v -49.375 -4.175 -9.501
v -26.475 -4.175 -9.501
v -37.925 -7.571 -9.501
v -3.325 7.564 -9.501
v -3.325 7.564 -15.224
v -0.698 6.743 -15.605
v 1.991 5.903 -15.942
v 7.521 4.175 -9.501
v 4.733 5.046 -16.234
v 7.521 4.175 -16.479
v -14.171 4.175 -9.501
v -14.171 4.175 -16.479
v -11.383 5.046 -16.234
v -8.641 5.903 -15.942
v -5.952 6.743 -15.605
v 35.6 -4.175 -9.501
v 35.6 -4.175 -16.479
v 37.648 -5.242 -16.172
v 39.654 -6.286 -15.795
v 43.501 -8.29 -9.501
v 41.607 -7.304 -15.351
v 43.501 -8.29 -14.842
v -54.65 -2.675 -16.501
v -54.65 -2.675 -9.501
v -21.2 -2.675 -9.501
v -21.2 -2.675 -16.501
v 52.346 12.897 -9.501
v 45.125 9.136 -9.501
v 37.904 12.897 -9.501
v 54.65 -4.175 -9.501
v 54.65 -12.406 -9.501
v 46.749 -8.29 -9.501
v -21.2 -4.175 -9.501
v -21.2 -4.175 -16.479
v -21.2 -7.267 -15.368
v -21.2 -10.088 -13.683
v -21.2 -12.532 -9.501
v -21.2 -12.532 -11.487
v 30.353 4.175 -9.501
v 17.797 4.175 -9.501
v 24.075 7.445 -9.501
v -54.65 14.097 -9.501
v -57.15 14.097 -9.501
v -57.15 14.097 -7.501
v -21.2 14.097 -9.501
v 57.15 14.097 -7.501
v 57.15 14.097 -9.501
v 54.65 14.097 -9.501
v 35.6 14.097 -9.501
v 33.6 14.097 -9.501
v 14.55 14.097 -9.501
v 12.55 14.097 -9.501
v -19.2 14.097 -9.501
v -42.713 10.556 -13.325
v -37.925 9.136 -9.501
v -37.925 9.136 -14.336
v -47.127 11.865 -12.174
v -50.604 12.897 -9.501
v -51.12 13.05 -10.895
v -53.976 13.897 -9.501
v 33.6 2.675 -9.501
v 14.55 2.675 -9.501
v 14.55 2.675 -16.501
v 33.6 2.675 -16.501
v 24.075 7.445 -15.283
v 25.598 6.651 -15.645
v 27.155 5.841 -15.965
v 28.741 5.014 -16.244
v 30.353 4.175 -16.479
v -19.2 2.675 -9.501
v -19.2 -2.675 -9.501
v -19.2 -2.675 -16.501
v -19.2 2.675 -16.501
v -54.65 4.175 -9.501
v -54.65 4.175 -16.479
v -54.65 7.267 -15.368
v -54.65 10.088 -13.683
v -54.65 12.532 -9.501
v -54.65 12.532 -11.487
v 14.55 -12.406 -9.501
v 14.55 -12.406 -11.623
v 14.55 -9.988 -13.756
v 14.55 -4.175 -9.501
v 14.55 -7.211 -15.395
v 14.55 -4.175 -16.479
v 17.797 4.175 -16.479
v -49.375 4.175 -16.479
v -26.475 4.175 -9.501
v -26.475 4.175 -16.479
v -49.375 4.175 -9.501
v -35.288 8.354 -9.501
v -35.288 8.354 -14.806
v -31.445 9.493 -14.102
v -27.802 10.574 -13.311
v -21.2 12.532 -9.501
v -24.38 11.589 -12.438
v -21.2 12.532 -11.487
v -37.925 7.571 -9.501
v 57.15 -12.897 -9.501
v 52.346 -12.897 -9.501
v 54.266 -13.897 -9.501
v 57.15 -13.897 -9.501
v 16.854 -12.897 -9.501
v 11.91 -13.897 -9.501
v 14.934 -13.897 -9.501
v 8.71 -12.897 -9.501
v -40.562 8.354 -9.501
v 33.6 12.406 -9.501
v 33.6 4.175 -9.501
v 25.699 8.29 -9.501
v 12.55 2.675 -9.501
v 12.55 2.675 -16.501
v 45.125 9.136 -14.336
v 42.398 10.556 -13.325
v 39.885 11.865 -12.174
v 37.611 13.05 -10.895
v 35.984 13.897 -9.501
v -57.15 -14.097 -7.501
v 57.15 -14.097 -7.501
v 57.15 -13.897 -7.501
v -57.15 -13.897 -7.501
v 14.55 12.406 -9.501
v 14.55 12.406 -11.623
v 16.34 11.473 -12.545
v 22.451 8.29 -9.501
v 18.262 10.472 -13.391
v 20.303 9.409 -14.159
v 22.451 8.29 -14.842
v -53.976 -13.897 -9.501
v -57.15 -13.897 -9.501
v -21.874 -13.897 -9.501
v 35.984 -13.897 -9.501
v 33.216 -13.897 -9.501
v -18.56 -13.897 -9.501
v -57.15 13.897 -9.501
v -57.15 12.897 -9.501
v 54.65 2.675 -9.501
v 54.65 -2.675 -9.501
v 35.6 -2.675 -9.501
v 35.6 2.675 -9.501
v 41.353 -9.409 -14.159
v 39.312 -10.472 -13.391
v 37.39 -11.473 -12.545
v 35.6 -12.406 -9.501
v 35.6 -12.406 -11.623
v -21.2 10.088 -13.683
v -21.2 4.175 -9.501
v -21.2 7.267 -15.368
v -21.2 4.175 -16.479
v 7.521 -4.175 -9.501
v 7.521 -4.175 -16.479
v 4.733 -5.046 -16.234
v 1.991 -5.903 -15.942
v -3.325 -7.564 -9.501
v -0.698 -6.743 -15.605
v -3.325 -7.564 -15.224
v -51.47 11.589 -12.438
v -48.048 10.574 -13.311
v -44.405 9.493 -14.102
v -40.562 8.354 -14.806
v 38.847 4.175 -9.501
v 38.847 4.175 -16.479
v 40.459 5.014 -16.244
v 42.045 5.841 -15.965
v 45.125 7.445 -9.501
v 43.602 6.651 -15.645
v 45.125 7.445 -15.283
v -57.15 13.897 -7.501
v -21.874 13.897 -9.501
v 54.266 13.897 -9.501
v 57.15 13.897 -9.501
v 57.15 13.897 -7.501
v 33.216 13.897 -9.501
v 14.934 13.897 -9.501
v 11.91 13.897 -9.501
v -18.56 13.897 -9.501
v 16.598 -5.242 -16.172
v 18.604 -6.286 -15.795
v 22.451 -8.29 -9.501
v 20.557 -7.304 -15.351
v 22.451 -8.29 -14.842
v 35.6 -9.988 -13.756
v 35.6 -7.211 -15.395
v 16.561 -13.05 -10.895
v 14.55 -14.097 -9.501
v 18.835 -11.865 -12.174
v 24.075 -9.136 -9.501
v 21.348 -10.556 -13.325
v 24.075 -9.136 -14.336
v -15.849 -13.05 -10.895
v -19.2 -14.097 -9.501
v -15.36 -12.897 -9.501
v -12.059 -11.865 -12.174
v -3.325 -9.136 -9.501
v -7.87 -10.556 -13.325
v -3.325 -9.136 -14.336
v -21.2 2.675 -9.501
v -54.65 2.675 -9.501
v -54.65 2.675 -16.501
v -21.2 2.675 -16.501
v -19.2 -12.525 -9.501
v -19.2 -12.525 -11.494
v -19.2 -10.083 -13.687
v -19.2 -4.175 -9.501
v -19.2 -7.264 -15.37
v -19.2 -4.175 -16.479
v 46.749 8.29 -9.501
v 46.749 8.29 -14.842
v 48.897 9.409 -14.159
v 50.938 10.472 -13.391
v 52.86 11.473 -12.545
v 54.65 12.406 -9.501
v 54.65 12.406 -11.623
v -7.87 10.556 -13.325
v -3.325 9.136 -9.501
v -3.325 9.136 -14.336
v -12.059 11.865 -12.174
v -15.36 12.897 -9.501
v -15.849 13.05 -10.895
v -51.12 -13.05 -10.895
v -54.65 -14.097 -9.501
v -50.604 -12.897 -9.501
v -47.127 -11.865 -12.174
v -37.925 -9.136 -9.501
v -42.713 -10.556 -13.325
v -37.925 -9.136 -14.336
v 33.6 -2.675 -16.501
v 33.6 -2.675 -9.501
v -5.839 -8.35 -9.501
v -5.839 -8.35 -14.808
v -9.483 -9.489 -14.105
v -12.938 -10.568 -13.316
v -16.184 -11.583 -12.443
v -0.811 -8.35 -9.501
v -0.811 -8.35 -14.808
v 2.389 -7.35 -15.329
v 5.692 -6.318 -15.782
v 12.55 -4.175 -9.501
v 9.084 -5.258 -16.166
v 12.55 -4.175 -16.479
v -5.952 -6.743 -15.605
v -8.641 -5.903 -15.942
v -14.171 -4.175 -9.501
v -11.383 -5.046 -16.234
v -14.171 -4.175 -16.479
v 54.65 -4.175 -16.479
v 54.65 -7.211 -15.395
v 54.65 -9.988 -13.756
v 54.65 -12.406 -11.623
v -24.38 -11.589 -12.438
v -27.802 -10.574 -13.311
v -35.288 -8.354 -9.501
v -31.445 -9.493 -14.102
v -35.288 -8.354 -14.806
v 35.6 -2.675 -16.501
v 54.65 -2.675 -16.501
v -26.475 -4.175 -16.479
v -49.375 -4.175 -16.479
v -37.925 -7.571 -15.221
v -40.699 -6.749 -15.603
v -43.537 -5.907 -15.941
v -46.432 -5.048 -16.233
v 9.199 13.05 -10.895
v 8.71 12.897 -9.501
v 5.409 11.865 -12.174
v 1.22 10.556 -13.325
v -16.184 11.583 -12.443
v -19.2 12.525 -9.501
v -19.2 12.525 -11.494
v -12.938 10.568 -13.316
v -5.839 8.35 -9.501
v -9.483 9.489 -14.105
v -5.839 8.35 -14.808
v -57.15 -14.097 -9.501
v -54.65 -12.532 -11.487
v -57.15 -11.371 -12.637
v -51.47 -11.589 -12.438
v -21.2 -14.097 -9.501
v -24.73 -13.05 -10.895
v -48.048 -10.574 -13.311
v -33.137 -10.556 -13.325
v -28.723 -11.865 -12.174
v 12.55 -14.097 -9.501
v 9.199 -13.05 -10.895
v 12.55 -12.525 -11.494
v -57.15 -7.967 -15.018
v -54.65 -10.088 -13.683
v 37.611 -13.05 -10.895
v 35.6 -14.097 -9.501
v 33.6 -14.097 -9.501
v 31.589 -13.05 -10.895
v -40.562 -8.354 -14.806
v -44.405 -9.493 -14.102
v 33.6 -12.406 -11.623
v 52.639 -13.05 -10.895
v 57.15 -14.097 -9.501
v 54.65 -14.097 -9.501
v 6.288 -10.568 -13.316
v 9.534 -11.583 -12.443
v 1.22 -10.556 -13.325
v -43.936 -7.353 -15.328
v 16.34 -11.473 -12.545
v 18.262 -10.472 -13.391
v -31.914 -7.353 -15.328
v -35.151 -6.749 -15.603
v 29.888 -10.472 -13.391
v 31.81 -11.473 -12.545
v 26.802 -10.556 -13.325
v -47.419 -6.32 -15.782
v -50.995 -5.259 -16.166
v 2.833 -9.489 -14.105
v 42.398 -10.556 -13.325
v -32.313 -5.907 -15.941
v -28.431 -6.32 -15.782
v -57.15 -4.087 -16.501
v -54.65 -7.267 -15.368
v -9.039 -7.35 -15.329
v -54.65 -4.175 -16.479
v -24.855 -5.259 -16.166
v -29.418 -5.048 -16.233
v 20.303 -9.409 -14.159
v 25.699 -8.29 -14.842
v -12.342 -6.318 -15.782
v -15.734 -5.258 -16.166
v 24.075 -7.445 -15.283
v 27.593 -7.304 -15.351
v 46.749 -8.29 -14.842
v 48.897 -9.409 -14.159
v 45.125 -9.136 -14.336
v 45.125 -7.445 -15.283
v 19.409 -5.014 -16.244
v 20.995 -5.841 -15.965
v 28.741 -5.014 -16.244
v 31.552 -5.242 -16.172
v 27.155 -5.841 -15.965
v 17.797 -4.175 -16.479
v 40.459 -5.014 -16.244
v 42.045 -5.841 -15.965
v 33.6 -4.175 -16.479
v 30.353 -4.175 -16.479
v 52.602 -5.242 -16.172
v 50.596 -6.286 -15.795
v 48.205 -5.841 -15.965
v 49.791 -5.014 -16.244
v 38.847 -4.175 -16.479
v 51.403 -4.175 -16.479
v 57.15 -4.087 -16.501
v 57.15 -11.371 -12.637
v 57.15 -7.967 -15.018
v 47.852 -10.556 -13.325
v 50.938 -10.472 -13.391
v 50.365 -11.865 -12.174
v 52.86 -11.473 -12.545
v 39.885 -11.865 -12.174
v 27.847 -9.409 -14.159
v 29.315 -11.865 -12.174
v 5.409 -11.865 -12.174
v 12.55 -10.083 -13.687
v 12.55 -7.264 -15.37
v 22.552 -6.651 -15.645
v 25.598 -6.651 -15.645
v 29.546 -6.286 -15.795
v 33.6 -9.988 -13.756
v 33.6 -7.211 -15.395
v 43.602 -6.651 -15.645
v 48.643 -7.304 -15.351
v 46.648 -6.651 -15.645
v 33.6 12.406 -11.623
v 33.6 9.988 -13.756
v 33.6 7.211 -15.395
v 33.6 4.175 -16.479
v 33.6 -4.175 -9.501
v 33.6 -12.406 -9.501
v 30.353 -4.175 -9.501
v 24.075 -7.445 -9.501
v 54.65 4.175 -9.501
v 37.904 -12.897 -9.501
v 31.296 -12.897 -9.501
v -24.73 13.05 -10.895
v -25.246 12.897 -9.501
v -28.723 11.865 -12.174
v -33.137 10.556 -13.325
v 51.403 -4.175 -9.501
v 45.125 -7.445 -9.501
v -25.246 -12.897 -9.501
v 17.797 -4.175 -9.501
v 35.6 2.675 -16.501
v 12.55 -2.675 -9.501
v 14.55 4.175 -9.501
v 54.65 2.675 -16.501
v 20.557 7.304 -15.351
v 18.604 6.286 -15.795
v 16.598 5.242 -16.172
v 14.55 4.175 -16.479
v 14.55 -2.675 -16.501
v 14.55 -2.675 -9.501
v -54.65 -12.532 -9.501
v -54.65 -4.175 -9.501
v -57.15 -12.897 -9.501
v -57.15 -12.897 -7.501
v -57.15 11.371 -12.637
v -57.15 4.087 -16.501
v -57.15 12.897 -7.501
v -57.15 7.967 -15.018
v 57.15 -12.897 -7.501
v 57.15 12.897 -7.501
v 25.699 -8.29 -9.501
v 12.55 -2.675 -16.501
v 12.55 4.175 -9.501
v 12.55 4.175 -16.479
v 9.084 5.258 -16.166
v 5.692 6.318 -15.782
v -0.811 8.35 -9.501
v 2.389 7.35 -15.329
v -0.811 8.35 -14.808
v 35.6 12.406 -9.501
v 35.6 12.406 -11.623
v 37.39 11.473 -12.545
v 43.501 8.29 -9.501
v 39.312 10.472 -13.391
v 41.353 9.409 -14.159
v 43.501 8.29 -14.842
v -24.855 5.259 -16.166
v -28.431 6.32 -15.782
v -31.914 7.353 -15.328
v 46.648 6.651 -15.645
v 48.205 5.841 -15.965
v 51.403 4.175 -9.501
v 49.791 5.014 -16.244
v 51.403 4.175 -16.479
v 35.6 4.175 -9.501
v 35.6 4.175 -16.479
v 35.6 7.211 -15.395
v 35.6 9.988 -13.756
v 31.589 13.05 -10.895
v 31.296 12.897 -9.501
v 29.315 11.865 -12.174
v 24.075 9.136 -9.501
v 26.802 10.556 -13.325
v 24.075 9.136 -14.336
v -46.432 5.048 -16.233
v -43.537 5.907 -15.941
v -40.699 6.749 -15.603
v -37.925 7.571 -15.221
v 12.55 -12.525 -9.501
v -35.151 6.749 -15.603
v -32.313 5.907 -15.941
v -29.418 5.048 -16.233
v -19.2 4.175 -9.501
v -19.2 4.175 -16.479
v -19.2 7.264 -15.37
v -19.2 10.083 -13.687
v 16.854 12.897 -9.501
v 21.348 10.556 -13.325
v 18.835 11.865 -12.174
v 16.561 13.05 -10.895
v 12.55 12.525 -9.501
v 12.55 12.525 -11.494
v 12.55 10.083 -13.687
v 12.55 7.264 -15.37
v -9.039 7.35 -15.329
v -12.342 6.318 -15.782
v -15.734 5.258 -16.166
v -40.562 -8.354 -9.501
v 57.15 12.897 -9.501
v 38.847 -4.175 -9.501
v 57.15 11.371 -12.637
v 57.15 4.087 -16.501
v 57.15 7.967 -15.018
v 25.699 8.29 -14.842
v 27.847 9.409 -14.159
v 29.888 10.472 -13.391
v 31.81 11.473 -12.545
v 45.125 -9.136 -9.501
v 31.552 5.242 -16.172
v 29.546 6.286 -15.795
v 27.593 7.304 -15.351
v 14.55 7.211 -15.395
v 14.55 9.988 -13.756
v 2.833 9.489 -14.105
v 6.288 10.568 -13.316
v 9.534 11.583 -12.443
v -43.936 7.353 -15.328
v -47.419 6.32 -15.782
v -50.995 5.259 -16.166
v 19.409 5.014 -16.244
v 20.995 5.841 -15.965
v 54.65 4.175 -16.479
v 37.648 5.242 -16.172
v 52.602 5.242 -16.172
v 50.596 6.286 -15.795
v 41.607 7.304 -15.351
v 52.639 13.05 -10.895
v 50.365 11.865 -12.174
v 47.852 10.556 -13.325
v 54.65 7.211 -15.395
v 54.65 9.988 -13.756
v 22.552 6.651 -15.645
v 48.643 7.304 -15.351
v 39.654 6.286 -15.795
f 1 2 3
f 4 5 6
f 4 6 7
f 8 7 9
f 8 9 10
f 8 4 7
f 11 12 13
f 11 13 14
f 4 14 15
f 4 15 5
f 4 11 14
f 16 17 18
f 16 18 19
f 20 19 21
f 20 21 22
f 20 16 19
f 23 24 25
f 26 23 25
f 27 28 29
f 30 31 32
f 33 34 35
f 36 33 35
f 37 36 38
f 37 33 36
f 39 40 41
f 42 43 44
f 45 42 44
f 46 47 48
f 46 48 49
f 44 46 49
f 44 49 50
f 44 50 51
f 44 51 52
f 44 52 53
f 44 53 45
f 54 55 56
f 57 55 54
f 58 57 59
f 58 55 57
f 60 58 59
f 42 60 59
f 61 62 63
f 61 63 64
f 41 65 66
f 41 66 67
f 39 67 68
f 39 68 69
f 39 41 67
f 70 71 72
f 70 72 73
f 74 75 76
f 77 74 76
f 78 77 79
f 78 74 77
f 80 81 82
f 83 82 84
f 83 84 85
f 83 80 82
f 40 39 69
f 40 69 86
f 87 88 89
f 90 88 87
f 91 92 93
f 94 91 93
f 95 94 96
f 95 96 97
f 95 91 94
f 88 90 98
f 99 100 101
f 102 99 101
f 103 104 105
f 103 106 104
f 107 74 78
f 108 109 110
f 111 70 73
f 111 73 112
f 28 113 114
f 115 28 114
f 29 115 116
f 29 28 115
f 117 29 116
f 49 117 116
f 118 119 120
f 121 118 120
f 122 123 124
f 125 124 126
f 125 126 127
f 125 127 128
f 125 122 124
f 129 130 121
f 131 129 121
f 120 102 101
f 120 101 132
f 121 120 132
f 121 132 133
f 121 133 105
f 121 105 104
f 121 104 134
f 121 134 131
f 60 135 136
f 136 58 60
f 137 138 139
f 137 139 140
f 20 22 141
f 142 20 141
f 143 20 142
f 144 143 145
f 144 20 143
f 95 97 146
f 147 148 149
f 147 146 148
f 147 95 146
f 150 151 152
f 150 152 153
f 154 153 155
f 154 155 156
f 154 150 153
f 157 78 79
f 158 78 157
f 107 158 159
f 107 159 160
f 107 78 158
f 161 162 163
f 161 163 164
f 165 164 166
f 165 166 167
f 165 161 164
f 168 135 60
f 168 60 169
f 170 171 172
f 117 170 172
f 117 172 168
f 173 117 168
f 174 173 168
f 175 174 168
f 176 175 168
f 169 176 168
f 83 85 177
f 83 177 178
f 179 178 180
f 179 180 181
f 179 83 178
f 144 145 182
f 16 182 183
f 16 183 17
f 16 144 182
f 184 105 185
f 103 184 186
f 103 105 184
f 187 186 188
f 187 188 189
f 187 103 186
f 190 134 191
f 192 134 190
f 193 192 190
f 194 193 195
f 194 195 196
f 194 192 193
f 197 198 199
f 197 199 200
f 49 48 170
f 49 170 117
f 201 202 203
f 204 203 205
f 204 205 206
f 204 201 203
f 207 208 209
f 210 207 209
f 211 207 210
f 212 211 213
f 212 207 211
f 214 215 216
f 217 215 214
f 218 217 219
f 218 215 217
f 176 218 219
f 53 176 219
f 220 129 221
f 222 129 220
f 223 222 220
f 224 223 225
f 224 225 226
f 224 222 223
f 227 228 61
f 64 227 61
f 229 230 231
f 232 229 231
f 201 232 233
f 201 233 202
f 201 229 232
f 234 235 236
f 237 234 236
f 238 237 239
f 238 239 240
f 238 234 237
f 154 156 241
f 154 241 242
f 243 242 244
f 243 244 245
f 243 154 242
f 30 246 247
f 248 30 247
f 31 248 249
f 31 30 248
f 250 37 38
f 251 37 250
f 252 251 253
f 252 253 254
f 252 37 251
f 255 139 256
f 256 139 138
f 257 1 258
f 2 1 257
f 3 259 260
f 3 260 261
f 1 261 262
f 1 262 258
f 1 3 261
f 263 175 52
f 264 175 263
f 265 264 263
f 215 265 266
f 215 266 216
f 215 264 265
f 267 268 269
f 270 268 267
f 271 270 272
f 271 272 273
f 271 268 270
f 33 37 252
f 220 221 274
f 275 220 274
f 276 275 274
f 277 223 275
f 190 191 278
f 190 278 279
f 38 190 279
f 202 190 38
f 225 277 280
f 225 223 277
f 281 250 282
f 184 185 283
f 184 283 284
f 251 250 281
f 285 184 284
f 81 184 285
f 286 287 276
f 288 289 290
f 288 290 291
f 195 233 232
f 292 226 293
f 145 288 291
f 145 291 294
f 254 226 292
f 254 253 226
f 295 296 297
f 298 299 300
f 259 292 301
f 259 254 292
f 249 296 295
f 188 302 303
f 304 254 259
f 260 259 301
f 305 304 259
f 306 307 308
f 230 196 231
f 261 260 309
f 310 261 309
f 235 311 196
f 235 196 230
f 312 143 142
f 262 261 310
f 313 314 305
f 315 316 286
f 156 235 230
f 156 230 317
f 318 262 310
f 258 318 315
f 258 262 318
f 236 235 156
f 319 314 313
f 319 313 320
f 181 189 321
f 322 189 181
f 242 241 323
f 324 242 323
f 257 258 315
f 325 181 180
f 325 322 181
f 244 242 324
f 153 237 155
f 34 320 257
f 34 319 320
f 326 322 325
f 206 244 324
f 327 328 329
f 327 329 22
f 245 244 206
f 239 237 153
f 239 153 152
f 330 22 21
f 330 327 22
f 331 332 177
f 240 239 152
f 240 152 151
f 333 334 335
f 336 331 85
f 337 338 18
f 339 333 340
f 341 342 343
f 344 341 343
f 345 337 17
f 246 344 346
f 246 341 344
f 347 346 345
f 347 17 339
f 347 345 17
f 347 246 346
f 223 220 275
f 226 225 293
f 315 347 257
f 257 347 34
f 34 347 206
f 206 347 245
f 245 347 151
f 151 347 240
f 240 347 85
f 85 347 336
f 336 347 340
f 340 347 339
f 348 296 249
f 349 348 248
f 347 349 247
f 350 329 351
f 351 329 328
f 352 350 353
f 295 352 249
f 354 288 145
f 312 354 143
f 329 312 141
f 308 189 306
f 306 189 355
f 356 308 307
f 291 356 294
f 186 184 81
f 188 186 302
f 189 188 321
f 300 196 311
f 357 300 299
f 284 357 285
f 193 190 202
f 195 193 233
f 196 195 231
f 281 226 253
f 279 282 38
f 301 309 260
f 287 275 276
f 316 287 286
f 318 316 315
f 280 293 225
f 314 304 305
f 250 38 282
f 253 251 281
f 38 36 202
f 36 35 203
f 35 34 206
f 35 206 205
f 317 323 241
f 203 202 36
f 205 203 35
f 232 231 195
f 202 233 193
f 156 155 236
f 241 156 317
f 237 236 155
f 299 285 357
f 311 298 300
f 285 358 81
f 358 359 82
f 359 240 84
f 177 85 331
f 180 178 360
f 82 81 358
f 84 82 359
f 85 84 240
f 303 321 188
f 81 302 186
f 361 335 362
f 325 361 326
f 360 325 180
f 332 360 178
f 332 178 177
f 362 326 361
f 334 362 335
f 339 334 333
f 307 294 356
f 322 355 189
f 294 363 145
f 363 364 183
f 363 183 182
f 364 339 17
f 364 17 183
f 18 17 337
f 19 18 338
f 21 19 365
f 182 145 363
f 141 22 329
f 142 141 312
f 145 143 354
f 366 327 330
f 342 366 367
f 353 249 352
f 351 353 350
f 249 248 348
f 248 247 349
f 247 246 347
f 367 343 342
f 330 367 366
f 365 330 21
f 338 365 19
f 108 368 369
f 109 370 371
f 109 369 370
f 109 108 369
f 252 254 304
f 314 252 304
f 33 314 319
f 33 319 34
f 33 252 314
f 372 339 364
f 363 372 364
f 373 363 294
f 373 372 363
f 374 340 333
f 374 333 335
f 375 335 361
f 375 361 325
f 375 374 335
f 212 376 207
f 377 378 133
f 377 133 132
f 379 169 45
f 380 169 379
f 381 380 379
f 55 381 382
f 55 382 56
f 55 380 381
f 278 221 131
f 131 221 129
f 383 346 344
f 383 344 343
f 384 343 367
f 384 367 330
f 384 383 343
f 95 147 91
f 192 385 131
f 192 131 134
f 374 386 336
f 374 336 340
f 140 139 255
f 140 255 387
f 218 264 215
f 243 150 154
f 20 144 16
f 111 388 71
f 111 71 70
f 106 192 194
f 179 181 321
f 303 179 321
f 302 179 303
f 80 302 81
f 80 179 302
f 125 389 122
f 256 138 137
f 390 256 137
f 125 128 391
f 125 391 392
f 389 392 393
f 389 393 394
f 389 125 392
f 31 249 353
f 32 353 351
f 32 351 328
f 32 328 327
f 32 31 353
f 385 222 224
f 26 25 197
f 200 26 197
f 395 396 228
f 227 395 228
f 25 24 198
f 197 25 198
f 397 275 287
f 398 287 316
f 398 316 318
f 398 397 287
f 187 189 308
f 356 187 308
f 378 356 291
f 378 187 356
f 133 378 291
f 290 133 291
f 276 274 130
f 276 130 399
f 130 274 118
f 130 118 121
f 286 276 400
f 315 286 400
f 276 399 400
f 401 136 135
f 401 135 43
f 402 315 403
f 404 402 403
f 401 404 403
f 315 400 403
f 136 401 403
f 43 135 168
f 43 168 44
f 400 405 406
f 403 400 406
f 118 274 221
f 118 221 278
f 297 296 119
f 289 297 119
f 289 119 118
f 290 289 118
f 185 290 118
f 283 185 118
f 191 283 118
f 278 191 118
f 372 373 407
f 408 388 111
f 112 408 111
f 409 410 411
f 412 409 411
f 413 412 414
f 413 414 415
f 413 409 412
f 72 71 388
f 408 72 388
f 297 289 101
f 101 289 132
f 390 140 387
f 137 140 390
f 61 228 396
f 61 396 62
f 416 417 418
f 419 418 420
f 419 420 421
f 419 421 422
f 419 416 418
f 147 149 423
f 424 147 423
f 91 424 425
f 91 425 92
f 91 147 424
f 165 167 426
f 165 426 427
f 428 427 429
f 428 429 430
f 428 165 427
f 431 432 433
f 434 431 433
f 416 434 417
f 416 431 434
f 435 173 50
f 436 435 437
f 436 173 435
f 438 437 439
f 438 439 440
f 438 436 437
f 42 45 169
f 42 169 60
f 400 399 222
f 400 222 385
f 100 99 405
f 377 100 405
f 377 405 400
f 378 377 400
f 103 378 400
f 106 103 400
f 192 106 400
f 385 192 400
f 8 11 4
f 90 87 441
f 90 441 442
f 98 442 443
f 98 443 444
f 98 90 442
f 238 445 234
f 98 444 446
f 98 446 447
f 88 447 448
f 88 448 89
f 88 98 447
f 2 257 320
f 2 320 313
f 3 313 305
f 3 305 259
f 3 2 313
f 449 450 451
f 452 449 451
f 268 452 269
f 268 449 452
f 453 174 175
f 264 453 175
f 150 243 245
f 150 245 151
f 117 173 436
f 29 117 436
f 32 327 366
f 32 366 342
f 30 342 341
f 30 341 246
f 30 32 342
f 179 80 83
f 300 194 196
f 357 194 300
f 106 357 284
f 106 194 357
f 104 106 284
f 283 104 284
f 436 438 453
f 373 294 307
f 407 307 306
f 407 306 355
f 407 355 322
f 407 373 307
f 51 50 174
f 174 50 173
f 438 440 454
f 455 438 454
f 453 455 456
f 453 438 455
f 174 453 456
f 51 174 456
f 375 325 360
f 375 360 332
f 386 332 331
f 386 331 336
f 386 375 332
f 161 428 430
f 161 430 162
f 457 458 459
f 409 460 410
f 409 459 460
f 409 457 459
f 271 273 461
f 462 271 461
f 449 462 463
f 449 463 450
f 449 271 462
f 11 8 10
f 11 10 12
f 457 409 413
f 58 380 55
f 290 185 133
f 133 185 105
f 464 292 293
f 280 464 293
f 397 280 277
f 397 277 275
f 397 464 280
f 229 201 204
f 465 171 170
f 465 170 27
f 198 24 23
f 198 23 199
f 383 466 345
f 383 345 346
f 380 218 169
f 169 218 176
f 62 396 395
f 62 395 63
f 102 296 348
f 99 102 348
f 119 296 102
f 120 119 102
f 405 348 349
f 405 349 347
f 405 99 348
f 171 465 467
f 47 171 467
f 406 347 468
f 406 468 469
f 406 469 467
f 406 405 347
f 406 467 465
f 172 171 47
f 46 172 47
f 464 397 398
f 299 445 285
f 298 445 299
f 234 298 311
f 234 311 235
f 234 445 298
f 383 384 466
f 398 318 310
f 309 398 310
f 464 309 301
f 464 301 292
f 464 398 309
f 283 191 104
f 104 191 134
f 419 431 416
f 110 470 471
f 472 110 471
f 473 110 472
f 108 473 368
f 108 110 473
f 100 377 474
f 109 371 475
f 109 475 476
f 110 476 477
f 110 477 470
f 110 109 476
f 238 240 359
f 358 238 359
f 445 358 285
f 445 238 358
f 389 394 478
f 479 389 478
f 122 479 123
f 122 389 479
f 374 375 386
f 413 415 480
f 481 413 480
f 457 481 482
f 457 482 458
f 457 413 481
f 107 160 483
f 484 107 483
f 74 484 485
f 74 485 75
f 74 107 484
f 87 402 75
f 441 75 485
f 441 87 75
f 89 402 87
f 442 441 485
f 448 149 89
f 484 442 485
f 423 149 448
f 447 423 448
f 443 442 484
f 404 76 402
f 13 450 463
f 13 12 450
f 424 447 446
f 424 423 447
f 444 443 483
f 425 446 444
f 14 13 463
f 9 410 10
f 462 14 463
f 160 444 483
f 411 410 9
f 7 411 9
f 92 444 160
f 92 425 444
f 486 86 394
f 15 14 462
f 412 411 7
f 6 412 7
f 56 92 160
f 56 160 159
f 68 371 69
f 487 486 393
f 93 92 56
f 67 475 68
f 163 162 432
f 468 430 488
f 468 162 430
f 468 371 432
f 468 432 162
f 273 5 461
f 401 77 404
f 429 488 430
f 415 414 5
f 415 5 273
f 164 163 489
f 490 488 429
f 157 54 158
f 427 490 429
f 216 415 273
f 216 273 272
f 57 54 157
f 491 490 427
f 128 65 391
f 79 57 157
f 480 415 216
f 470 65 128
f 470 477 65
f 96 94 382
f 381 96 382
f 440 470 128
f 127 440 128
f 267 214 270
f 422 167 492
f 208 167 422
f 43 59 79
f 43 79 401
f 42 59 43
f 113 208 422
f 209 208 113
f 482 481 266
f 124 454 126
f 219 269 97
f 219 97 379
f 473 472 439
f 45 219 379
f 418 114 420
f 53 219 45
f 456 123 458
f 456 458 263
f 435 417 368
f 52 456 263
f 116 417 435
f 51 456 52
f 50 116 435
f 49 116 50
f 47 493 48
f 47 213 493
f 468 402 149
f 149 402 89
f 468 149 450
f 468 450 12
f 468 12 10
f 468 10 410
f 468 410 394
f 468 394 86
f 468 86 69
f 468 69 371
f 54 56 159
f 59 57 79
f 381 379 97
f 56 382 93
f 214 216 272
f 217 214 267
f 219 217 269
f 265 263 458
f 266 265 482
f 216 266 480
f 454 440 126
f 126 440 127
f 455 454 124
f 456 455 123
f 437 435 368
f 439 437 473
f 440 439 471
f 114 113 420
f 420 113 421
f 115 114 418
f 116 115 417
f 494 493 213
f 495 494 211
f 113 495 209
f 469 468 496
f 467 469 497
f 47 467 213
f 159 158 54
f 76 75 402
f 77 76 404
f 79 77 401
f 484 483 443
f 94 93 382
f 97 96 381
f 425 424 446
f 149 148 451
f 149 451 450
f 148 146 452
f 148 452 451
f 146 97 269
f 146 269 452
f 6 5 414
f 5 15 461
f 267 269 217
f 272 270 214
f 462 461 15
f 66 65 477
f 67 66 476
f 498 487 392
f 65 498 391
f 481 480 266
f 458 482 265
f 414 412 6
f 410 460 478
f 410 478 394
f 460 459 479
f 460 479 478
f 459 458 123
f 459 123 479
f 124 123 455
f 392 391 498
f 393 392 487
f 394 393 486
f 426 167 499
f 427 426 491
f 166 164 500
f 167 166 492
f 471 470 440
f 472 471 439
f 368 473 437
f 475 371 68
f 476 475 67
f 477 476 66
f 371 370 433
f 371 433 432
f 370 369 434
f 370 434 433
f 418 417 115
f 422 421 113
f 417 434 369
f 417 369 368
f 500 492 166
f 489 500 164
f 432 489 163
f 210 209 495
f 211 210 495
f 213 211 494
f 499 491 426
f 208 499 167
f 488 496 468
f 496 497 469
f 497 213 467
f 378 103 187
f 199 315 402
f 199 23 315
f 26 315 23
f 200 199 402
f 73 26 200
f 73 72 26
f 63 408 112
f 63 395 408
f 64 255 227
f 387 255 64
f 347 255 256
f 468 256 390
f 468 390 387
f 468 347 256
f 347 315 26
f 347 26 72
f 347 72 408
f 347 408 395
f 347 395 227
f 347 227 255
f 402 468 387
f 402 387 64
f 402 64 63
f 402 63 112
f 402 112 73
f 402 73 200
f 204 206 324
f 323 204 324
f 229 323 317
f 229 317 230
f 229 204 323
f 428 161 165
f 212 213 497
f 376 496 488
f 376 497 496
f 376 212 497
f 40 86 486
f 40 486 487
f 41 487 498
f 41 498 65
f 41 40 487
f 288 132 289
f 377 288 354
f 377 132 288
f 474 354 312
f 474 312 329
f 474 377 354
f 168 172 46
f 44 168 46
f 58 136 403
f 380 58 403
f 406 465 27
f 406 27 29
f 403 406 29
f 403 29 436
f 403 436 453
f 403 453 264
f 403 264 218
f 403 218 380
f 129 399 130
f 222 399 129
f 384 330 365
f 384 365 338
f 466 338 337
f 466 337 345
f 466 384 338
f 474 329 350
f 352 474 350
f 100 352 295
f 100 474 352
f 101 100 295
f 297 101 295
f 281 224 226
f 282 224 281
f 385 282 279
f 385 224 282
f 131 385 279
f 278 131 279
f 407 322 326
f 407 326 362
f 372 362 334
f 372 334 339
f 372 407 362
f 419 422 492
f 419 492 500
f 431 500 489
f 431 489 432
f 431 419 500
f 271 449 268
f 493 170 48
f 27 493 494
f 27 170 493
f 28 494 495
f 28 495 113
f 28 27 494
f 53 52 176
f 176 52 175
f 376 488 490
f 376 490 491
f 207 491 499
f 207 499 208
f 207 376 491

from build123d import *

# Parameters (mm, degrees)
F0_W      = 25.79375
F0_H      = 2
F2_DEPTH  = 57.15
F3_W      = 33.45
F3_H      = 5.35
F3_W_2    = 31.75
F3_W_3    = 19.05
F4_DEPTH  = 25.4
F5_W      = 25.79375
F5_H      = 2
F6_DEPTH  = 114.3
F7_W      = 24.949031
F7_H      = 4.702146
F8_DEPTH  = 114.3
F9_W      = 0.2
F9_H      = 2
F10_DEPTH = 114.3


with BuildPart() as f2:
    # F0 (on Right) → F2 (new body, symmetric)
    with BuildSketch(Plane.YZ):
        with BuildLine():
            Line((-12.896875, -9.50148), (-14.096875, -9.50148))
            ThreePointArc((-14.096875, -9.50148), (0, -17), (14.096875, -9.50148))
            Line((14.096875, -9.50148), (12.896875, -9.50148))
            Line((12.896875, -9.50148), (-12.896875, -9.50148))
        make_face()
        with Locations((0, -8.50148)):
            Rectangle(F0_W, F0_H)
    extrude(amount=F2_DEPTH, both=True)

    # F3 (on face) → F4 (intersect)
    with BuildSketch(Plane.XY.offset(-9.50148)):
        Polygon((-54.65, 14.096875), (-57.15, 14.096875), (-57.15, -14.096875), (-54.65, -14.096875), (-37.925, -9.135938), (-21.2, -14.096875), (-19.2, -14.096875), (-3.325, -9.135938), (12.55, -14.096875), (14.55, -14.096875), (24.075, -9.135937), (33.6, -14.096875), (35.6, -14.096875), (45.125, -9.135937), (54.65, -14.096875), (57.15, -14.096875), (57.15, 14.096875), (54.65, 14.096875), (45.125, 9.135938), (35.6, 14.096875), (33.6, 14.096875), (24.075, 9.135937), (14.55, 14.096875), (12.55, 14.096875), (-3.325, 9.135937), (-19.2, 14.096875), (-21.2, 14.096875), (-37.925, 9.135938), align=None)
        Polygon((-40.562391, -8.35364), (-54.65, -12.532279), (-54.65, -4.175), align=None, mode=Mode.SUBTRACT)
        Polygon((-21.2, -4.175), (-21.2, -12.532279), (-35.287609, -8.35364), align=None, mode=Mode.SUBTRACT)
        Polygon((-5.839458, -8.350169), (-19.2, -12.525339), (-19.2, -4.175), align=None, mode=Mode.SUBTRACT)
        Polygon((-37.925, -7.571342), (-49.375218, -4.175), (-26.474782, -4.175), align=None, mode=Mode.SUBTRACT)
        Polygon((-3.325, -7.564401), (-14.171084, -4.175), (7.521084, -4.175), align=None, mode=Mode.SUBTRACT)
        Polygon((12.55, -4.175), (12.55, -12.525339), (-0.810542, -8.350169), align=None, mode=Mode.SUBTRACT)
        Polygon((22.451393, -8.290309), (14.55, -12.405618), (14.55, -4.175), align=None, mode=Mode.SUBTRACT)
        Polygon((33.6, -4.175), (33.6, -12.405618), (25.698607, -8.290309), align=None, mode=Mode.SUBTRACT)
        Polygon((43.501393, -8.290309), (35.6, -12.405618), (35.6, -4.175), align=None, mode=Mode.SUBTRACT)
        Polygon((54.65, -4.175), (54.65, -12.405618), (46.748607, -8.290309), align=None, mode=Mode.SUBTRACT)
        Polygon((24.075, -7.44468), (17.797214, -4.175), (30.352786, -4.175), align=None, mode=Mode.SUBTRACT)
        Polygon((45.125, -7.44468), (38.847214, -4.175), (51.402786, -4.175), align=None, mode=Mode.SUBTRACT)
        with Locations((-37.925, 0)):
            Rectangle(F3_W, F3_H, mode=Mode.SUBTRACT)
        Polygon((-26.474782, 4.175), (-49.375218, 4.175), (-37.925, 7.571342), align=None, mode=Mode.SUBTRACT)
        with Locations((-3.325, 0)):
            Rectangle(F3_W_2, F3_H, mode=Mode.SUBTRACT)
        Polygon((7.521084, 4.175), (-14.171084, 4.175), (-3.325, 7.564401), align=None, mode=Mode.SUBTRACT)
        Polygon((-40.562391, 8.35364), (-54.65, 4.175), (-54.65, 12.532279), align=None, mode=Mode.SUBTRACT)
        Polygon((-21.2, 12.532279), (-21.2, 4.175), (-35.287609, 8.35364), align=None, mode=Mode.SUBTRACT)
        Polygon((-5.839458, 8.350169), (-19.2, 4.175), (-19.2, 12.525339), align=None, mode=Mode.SUBTRACT)
        with Locations((24.075, 0)):
            Rectangle(F3_W_3, F3_H, mode=Mode.SUBTRACT)
        Polygon((30.352786, 4.175), (17.797214, 4.175), (24.075, 7.44468), align=None, mode=Mode.SUBTRACT)
        with Locations((45.125, 0)):
            Rectangle(F3_W_3, F3_H, mode=Mode.SUBTRACT)
        Polygon((51.402786, 4.175), (38.847214, 4.175), (45.125, 7.44468), align=None, mode=Mode.SUBTRACT)
        Polygon((12.55, 12.525339), (12.55, 4.175), (-0.810542, 8.350169), align=None, mode=Mode.SUBTRACT)
        Polygon((22.451393, 8.290309), (14.55, 4.175), (14.55, 12.405618), align=None, mode=Mode.SUBTRACT)
        Polygon((33.6, 12.405618), (33.6, 4.175), (25.698607, 8.290309), align=None, mode=Mode.SUBTRACT)
        Polygon((43.501393, 8.290309), (35.6, 4.175), (35.6, 12.405618), align=None, mode=Mode.SUBTRACT)
        Polygon((54.65, 12.405618), (54.65, 4.175), (46.748607, 8.290309), align=None, mode=Mode.SUBTRACT)
    extrude(amount=-F4_DEPTH, mode=Mode.INTERSECT)

    # F5 (on face) → F6 (join)
    with BuildSketch(Plane.YZ.offset(57.15)):
        with Locations((0, -8.50148)):
            Rectangle(F5_W, F5_H)
    extrude(amount=-F6_DEPTH)

    # F7 (on face) → F8 (cut)
    with BuildSketch(Plane.YZ.offset(57.15)):
        with Locations((-1.411293, -18.852553)):
            Rectangle(F7_W, F7_H)
    extrude(amount=-F8_DEPTH, mode=Mode.SUBTRACT)

    # F9 (on face) → F10 (join)
    with BuildSketch(Plane.YZ.offset(57.15)):
        with Locations((-13.996875, -8.50148)):
            Rectangle(F9_W, F9_H)
        with Locations((13.996875, -8.50148)):
            Rectangle(F9_W, F9_H)
    extrude(amount=-F10_DEPTH)


solid = f2.part
